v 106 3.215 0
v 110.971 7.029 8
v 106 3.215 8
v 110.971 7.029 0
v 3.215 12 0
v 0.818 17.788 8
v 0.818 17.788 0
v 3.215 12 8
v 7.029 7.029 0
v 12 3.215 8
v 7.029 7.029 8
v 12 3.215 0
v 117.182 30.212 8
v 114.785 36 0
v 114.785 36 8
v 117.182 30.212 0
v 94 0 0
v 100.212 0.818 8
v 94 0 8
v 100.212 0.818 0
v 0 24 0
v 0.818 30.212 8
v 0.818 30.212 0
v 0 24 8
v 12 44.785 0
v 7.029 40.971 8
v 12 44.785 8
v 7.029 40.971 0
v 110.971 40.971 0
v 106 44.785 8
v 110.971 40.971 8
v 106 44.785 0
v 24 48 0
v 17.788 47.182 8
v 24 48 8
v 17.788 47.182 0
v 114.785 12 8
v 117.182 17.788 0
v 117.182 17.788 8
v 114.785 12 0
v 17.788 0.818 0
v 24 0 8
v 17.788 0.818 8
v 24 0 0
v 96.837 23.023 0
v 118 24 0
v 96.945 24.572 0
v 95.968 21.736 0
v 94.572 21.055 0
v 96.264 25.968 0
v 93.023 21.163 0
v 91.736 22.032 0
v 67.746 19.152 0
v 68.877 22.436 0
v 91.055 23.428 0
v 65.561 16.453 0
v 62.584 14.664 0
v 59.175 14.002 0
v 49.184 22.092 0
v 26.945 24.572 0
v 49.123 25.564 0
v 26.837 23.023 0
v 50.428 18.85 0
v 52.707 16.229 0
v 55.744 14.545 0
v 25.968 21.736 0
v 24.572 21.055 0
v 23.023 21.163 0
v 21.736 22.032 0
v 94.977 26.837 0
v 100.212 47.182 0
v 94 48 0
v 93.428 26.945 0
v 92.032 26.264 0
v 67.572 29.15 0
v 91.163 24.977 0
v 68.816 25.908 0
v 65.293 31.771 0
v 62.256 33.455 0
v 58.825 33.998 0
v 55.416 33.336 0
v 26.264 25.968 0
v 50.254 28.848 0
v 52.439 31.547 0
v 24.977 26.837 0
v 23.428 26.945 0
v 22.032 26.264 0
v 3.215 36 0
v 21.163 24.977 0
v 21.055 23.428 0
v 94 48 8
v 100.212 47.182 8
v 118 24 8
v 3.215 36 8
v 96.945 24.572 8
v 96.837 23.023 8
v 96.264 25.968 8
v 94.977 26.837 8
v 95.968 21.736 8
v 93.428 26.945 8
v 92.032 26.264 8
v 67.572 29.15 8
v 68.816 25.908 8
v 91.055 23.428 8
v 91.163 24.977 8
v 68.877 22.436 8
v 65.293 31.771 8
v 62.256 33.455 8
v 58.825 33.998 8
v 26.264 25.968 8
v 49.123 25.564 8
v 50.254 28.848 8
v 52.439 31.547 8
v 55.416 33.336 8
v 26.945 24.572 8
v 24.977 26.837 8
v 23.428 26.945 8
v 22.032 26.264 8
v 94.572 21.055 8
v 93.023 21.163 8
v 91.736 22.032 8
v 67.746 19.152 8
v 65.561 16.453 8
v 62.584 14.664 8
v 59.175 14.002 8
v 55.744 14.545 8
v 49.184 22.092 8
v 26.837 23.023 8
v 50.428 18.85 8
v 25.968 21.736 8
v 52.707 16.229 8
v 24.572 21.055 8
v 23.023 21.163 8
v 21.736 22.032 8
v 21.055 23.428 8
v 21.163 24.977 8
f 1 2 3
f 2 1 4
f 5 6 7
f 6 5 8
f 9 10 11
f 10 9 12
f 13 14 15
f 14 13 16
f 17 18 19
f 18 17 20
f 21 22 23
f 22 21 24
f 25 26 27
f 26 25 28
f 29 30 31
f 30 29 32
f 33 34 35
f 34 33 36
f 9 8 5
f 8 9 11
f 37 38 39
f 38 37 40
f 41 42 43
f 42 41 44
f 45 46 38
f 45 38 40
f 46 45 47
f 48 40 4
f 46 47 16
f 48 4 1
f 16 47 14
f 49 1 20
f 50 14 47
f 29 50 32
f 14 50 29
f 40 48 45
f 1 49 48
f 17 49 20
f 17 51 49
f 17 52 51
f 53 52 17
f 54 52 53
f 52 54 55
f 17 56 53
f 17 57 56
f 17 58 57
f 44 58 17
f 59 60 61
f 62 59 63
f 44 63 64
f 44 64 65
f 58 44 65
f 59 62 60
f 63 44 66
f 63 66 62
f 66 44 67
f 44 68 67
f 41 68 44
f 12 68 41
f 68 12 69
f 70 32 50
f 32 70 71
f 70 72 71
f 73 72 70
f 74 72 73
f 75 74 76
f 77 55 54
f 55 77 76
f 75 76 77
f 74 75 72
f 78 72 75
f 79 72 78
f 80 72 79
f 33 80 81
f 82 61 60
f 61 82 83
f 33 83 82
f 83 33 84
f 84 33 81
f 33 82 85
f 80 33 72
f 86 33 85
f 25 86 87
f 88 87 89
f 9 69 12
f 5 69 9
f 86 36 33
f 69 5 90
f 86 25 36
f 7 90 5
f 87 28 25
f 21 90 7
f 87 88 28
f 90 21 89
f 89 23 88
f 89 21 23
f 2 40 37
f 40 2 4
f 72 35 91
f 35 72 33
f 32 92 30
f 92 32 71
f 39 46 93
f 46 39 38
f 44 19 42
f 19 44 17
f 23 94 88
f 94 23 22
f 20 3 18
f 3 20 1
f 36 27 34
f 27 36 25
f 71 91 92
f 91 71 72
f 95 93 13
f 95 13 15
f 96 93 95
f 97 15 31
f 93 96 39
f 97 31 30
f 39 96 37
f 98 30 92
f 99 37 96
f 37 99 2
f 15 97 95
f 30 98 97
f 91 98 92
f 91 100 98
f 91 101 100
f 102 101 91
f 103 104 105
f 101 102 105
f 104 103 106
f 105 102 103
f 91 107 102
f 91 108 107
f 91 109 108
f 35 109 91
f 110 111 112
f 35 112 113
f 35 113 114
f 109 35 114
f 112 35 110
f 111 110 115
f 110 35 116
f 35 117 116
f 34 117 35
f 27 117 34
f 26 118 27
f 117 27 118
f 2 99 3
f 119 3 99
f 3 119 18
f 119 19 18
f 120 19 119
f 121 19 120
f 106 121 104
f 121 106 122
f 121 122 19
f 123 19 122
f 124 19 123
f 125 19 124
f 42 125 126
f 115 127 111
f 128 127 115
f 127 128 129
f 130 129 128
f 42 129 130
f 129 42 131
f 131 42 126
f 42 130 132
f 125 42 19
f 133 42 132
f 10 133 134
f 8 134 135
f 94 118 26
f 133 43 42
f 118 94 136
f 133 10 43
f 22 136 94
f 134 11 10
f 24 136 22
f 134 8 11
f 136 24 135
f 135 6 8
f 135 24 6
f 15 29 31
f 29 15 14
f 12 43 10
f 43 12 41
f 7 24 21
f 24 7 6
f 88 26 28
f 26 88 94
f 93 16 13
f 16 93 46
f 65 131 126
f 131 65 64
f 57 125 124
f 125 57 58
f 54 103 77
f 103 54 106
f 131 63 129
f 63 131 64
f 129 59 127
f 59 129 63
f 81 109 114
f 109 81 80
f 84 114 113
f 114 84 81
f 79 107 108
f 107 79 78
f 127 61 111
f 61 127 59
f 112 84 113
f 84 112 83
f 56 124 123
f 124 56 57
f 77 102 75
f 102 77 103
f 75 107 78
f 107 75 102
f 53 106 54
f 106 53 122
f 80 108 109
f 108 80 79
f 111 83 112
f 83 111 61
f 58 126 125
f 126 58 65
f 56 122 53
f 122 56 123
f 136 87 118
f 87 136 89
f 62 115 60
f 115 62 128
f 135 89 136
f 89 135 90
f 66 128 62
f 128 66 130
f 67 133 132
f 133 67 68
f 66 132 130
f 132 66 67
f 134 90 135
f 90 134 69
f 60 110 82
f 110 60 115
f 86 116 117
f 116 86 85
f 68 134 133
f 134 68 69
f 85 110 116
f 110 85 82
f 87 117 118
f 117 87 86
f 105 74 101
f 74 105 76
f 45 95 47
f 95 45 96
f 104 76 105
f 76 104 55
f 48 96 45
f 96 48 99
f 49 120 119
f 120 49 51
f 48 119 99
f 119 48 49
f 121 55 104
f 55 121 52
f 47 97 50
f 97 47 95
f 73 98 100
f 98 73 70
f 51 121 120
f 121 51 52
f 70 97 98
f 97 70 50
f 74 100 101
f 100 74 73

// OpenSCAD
$fn = 32;

// ----------------------------------------------------------------------
// Spacer plate: obround span 70, caps R24
// ----------------------------------------------------------------------

// --- parameters (mm) ---
bore_r = 10;              // centre bore radius
bolt_r = 3;               // bolt hole radius
plate_t = 8;              // plate thickness, Z (extrusion height)
span = 70;                // obround span
cap_r = 24;               // cap radius

profile = [[24, 48], [17.788, 47.182], [12, 44.785], [7.029, 40.971], [3.215, 36], [0.818, 30.212], [0, 24], [0.818, 17.788], [3.215, 12], [7.029, 7.029], [12, 3.215], [17.788, 0.818], [24, 0], [94, 0], [100.212, 0.818], [106, 3.215], [110.971, 7.029], [114.785, 12], [117.182, 17.788], [118, 24], [117.182, 30.212], [114.785, 36], [110.971, 40.971], [106, 44.785], [100.212, 47.182], [94, 48]];  // primary outline, 26 points, counter clockwise
void_1 = [[68.816, 25.908], [67.572, 29.15], [65.293, 31.771], [62.256, 33.455], [58.825, 33.998], [55.416, 33.336], [52.439, 31.547], [50.254, 28.848], [49.123, 25.564], [49.184, 22.092], [50.428, 18.85], [52.707, 16.229], [55.744, 14.545], [59.175, 14.002], [62.584, 14.664], [65.561, 16.453], [67.746, 19.152], [68.877, 22.436]];  // centre bore, 18 points
void_2 = [[26.945, 24.572], [26.264, 25.968], [24.977, 26.837], [23.428, 26.945], [22.032, 26.264], [21.163, 24.977], [21.055, 23.428], [21.736, 22.032], [23.023, 21.163], [24.572, 21.055], [25.968, 21.736], [26.837, 23.023]];  // end hole, 12 points
void_3 = [[96.945, 24.572], [96.264, 25.968], [94.977, 26.837], [93.428, 26.945], [92.032, 26.264], [91.163, 24.977], [91.055, 23.428], [91.736, 22.032], [93.023, 21.163], [94.572, 21.055], [95.968, 21.736], [96.837, 23.023]];  // end hole, 12 points

// --- the one profile operation ---
difference() {
  linear_extrude(height = plate_t) polygon(points = profile);
  translate([0, 0, -1])
    linear_extrude(height = plate_t + 2) polygon(points = void_1);
  translate([0, 0, -1])
    linear_extrude(height = plate_t + 2) polygon(points = void_2);
  translate([0, 0, -1])
    linear_extrude(height = plate_t + 2) polygon(points = void_3);
}
